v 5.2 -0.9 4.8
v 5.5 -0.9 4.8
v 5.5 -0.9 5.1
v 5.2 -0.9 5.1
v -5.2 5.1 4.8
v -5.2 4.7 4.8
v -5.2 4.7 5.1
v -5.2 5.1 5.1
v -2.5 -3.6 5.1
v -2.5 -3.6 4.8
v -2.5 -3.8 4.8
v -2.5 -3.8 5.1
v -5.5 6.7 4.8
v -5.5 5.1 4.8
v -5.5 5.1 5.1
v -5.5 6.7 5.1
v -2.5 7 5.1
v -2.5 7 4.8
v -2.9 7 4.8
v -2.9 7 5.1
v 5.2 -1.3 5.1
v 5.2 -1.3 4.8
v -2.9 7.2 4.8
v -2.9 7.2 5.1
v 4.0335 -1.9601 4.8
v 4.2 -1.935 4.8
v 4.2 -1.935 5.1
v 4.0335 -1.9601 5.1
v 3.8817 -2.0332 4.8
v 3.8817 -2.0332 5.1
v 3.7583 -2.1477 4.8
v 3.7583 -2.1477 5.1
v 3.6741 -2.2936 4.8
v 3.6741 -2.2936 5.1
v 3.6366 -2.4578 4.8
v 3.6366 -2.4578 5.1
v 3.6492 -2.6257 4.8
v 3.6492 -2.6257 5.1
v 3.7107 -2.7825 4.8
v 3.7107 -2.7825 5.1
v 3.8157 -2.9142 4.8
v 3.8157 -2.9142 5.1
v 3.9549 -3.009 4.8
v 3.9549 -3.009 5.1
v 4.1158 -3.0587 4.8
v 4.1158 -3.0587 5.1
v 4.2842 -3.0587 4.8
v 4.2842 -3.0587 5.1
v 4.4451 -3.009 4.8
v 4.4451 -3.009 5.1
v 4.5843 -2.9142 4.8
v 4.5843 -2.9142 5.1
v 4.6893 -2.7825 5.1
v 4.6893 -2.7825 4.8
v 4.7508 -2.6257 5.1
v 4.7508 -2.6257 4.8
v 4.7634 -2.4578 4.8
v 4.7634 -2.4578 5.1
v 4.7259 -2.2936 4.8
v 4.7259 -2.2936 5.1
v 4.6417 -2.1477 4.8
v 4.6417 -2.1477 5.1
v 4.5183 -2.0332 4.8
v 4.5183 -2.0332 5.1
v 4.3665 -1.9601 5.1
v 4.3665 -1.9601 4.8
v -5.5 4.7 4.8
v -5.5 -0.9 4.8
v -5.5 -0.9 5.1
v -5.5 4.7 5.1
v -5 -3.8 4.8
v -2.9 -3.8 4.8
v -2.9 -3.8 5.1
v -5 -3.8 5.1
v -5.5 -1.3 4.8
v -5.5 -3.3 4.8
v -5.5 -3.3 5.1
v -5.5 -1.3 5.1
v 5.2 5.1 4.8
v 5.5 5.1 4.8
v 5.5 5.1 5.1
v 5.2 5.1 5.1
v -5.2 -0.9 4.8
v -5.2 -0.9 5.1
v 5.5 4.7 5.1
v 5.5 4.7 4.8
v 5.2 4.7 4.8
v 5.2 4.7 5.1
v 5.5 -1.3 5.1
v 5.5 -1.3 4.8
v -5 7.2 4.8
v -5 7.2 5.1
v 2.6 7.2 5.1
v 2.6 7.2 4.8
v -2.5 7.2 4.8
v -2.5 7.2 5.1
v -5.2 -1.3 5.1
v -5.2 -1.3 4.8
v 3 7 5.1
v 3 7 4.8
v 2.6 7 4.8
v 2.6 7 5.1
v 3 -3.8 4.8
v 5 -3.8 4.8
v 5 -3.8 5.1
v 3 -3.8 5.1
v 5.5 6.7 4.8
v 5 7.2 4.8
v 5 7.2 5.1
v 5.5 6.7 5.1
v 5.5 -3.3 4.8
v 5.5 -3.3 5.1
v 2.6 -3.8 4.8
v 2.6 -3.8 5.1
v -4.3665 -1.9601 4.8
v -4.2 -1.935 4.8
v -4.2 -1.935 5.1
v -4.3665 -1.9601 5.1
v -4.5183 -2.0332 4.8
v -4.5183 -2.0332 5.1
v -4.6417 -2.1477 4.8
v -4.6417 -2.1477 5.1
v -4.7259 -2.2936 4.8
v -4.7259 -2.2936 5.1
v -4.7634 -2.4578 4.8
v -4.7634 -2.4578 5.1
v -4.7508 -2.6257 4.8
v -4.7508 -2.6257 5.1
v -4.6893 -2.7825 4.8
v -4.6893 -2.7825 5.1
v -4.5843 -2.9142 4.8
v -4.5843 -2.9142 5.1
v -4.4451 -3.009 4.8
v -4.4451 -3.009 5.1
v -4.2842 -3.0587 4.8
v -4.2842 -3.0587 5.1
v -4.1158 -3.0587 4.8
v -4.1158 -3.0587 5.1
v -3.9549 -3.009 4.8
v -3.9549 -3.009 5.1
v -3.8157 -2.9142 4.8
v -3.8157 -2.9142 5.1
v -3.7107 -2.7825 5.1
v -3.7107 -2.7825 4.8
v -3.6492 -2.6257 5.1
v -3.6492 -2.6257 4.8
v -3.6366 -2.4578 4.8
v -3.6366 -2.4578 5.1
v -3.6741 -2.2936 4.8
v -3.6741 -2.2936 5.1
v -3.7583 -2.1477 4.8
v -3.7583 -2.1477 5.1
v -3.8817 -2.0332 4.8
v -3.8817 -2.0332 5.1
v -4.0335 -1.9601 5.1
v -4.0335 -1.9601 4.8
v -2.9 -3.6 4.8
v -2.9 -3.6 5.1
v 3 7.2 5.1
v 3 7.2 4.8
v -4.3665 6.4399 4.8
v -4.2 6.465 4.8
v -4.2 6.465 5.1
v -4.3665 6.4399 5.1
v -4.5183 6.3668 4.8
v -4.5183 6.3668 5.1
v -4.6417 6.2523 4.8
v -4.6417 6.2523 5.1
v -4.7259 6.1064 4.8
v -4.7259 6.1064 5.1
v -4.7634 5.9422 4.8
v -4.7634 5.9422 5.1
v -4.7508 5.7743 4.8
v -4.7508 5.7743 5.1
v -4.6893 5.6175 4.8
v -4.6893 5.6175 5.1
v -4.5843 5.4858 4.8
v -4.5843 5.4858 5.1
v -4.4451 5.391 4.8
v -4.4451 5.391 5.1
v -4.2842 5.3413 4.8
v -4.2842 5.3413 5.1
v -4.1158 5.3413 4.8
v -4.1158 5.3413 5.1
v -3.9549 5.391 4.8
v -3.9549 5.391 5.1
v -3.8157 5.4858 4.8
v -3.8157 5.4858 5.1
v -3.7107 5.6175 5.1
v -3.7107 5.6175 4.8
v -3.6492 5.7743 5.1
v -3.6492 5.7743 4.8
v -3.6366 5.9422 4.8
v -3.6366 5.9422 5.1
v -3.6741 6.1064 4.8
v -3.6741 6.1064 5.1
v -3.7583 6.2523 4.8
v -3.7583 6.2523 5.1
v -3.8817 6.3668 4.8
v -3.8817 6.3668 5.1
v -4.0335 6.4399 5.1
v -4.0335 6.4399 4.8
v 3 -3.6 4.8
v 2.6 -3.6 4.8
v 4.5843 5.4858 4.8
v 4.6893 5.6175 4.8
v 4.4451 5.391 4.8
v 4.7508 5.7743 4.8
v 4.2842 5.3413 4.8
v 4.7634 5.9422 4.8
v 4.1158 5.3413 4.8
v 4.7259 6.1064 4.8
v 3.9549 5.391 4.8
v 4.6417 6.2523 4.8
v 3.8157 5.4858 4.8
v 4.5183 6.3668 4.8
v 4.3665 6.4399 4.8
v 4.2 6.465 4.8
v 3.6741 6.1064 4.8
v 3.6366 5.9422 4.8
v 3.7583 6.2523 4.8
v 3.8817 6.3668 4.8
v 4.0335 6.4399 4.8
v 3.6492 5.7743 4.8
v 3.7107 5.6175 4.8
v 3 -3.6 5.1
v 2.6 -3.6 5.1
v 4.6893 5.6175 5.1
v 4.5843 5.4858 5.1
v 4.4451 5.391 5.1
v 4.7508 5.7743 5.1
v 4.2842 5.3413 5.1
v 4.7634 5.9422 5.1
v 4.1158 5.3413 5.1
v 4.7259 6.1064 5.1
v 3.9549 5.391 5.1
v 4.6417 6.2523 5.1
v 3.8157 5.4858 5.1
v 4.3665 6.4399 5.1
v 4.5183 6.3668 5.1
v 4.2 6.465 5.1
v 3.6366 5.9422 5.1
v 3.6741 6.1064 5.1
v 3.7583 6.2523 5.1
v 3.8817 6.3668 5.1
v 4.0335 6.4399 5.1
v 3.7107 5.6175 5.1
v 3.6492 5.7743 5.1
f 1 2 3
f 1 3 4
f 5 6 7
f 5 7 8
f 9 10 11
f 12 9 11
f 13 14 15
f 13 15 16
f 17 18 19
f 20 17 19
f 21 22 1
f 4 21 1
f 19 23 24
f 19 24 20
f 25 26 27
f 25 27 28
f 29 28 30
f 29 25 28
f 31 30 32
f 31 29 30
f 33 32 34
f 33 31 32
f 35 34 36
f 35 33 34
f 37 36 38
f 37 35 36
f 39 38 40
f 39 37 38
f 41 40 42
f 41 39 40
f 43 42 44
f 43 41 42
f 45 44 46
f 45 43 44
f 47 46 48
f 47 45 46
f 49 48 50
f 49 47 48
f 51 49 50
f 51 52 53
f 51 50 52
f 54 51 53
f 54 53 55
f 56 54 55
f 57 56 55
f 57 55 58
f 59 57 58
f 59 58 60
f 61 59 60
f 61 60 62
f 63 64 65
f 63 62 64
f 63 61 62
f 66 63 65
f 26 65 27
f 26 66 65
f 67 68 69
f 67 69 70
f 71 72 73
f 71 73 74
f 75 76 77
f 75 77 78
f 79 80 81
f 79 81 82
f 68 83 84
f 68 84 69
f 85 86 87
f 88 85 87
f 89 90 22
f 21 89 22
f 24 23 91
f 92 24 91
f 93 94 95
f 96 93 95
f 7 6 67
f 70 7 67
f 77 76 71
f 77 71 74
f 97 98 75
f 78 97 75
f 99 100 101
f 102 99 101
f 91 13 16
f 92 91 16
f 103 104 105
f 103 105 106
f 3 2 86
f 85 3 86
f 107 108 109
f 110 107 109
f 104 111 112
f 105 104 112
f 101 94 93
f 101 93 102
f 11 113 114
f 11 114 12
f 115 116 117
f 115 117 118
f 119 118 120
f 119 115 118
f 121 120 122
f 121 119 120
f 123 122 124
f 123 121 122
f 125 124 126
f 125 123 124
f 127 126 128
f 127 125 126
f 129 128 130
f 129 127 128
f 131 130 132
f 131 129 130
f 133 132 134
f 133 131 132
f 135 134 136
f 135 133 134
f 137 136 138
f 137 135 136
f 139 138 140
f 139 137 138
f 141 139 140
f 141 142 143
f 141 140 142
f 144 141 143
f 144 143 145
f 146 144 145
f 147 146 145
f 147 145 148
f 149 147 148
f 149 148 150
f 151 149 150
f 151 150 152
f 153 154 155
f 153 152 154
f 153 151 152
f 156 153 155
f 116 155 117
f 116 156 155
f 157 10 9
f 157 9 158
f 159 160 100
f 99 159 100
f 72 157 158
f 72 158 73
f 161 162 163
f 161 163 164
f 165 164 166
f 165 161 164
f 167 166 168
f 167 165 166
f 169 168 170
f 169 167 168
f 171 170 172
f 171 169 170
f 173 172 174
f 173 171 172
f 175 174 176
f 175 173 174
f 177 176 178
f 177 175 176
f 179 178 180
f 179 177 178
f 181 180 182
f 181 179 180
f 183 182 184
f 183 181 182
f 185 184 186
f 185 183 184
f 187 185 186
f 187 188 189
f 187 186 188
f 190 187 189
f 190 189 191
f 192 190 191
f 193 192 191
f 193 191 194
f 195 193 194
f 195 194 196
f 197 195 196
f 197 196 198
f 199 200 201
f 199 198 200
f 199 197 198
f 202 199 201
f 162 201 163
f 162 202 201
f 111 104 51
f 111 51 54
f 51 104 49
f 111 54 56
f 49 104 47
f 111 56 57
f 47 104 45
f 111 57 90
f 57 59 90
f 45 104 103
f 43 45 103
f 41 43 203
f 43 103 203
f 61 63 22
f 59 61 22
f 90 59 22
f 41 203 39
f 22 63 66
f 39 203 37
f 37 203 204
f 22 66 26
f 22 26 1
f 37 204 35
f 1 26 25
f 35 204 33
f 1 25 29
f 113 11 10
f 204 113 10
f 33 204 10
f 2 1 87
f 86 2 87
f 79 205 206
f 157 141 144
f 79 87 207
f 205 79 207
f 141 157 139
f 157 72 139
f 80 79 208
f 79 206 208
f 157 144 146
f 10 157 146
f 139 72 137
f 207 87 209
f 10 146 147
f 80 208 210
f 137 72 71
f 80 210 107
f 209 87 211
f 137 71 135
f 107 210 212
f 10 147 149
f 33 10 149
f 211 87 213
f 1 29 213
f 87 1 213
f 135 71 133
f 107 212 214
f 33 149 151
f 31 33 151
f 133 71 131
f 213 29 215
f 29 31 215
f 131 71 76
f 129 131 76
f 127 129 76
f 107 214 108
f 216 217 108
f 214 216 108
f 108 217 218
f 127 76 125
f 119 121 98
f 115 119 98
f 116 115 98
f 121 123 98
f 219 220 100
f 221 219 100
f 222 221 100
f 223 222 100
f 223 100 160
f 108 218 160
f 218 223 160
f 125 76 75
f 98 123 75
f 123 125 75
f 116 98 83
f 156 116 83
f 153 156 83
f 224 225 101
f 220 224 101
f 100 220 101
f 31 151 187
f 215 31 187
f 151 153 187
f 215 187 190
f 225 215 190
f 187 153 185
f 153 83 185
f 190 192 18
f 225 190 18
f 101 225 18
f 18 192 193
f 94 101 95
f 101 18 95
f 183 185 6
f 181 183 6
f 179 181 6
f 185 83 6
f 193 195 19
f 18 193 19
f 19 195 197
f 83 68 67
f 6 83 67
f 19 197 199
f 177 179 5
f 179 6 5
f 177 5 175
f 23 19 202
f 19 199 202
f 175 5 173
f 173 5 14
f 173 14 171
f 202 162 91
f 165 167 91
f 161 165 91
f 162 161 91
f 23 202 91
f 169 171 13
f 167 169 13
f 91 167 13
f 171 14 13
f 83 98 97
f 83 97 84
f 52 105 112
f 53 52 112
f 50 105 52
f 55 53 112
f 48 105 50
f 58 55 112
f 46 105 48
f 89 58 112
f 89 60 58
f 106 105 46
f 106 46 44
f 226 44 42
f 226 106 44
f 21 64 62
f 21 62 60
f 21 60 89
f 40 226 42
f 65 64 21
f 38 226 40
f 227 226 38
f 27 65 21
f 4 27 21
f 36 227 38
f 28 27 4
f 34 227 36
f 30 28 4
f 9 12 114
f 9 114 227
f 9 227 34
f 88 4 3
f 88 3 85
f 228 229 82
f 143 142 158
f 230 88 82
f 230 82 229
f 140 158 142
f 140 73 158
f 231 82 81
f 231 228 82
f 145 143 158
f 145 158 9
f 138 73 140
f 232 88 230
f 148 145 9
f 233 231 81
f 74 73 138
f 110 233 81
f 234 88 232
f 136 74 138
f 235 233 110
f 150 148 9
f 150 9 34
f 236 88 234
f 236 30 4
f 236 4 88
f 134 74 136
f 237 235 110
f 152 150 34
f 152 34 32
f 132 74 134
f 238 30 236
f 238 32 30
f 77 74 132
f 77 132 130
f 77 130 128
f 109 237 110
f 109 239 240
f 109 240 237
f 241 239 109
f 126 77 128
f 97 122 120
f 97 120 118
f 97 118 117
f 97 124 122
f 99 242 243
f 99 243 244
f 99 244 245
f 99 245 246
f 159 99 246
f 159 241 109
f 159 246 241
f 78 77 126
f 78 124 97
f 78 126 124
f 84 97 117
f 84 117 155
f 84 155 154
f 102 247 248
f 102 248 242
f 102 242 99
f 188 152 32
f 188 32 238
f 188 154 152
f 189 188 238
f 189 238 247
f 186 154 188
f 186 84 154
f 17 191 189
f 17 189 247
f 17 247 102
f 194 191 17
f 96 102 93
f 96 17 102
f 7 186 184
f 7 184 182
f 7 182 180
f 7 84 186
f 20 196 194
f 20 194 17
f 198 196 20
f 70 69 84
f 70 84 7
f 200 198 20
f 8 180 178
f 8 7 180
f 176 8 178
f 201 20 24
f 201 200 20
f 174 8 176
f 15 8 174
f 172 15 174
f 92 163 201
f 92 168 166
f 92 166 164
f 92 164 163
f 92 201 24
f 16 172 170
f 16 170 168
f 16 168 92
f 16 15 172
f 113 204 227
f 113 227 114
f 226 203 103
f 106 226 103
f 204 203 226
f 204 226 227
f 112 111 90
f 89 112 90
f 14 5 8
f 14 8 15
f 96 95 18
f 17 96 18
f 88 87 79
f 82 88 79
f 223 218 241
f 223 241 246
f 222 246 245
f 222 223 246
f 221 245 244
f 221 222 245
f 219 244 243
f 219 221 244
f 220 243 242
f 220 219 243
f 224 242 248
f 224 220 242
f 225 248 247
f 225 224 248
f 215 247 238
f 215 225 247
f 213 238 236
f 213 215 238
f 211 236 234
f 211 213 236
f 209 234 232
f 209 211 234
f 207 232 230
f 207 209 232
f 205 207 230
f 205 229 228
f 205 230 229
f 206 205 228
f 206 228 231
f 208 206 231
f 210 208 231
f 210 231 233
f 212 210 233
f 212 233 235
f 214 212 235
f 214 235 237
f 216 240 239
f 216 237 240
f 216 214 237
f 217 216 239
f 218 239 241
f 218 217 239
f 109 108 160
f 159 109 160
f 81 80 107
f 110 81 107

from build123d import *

# Parameters (mm, degrees)
CYLINDER013_R          = 0.565
CYLINDER013_DEPTH      = 5
CYLINDER012_R          = 0.565
CYLINDER012_DEPTH      = 5
CYLINDER008_R          = 0.565
CYLINDER008_DEPTH      = 5
CYLINDER003_R          = 0.565
CYLINDER003_DEPTH      = 5
BOX018_W               = 0.4
BOX018_H               = 1
BOX018_DEPTH           = 1
BOX018_PLACEMENT_ANGLE = 90
BOX001_W               = 0.4
BOX001_H               = 1
BOX001_DEPTH           = 1
BOX001_PLACEMENT_ANGLE = 90
BOX014_W               = 0.4
BOX014_H               = 1
BOX014_DEPTH           = 1
BOX014_PLACEMENT_ANGLE = 90
BOX015_W               = 0.4
BOX015_H               = 1
BOX015_DEPTH           = 1
BOX015_PLACEMENT_ANGLE = 90
BOX017_W               = 0.4
BOX017_H               = 1
BOX017_DEPTH           = 1
BOX016_W               = 0.4
BOX016_H               = 1
BOX016_DEPTH           = 1
BOX013_W               = 0.4
BOX013_H               = 1
BOX013_DEPTH           = 1
BOX_W                  = 0.4
BOX_H                  = 1
BOX_DEPTH              = 1
BOX012_W               = 11
BOX012_H               = 11
BOX012_DEPTH           = 0.3
CHAMFER002_SIZE        = 0.5
CUT010_PLACEMENT_ANGLE = 90


with BuildPart() as cilindro009:
    # Cylinder013 → Cylinder013 (new body)
    with BuildSketch(Plane(origin=(4.2, -4.2, 0), x_dir=(1, 0, 0), z_dir=(0, 0, 1))):
        Circle(CYLINDER013_R)
    extrude(amount=CYLINDER013_DEPTH)


with BuildPart() as cilindro008:
    # Cylinder012 → Cylinder012 (new body)
    with BuildSketch(Plane(origin=(-4.2, -4.2, 0), x_dir=(1, 0, 0), z_dir=(0, 0, 1))):
        Circle(CYLINDER012_R)
    extrude(amount=CYLINDER012_DEPTH)


with BuildPart() as cilindro006:
    # Cylinder008 → Cylinder008 (new body)
    with BuildSketch(Plane(origin=(4.2, 4.2, 0), x_dir=(1, 0, 0), z_dir=(0, 0, 1))):
        Circle(CYLINDER008_R)
    extrude(amount=CYLINDER008_DEPTH)


with BuildPart() as cilindro007:
    # Cylinder003 → Cylinder003 (new body)
    with BuildSketch(Plane(origin=(-4.2, 4.2, 0), x_dir=(1, 0, 0), z_dir=(0, 0, 1))):
        Circle(CYLINDER003_R)
    extrude(amount=CYLINDER003_DEPTH)


with BuildPart() as pesta_adinf001:
    # Box018 → Box018 (new body)
    with BuildSketch(Plane.XY):
        with Locations((0.2, 0.5)):
            Rectangle(BOX018_W, BOX018_H)
    extrude(amount=BOX018_DEPTH)


with BuildPart() as pesta_adinf001_1:
    # Box018 placement: moved
    add(pesta_adinf001.part.moved(Location((6.3, -3, 3))).rotate(Axis((6.3, -3, 3), (0, 0, 1)), BOX018_PLACEMENT_ANGLE))


with BuildPart() as pesta_ads001:
    # Box001 → Box001 (new body)
    with BuildSketch(Plane.XY):
        with Locations((0.2, 0.5)):
            Rectangle(BOX001_W, BOX001_H)
    extrude(amount=BOX001_DEPTH)


with BuildPart() as pesta_ads001_1:
    # Box001 placement: moved
    add(pesta_ads001.part.moved(Location((6.3, 2.5, 3))).rotate(Axis((6.3, 2.5, 3), (0, 0, 1)), BOX001_PLACEMENT_ANGLE))


with BuildPart() as pesta_aiinf001:
    # Box014 → Box014 (new body)
    with BuildSketch(Plane.XY):
        with Locations((0.2, 0.5)):
            Rectangle(BOX014_W, BOX014_H)
    extrude(amount=BOX014_DEPTH)


with BuildPart() as pesta_aiinf001_1:
    # Box014 placement: moved
    add(pesta_aiinf001.part.moved(Location((-5.3, -3, 3))).rotate(Axis((-5.3, -3, 3), (0, 0, 1)), BOX014_PLACEMENT_ANGLE))


with BuildPart() as pesta_ais001:
    # Box015 → Box015 (new body)
    with BuildSketch(Plane.XY):
        with Locations((0.2, 0.5)):
            Rectangle(BOX015_W, BOX015_H)
    extrude(amount=BOX015_DEPTH)


with BuildPart() as pesta_ais001_1:
    # Box015 placement: moved
    add(pesta_ais001.part.moved(Location((-5.3, 2.5, 3))).rotate(Axis((-5.3, 2.5, 3), (0, 0, 1)), BOX015_PLACEMENT_ANGLE))


with BuildPart() as pesta_aid001:
    # Box017 → Box017 (new body)
    with BuildSketch(Plane(origin=(3, -6.2, 3), x_dir=(1, 0, 0), z_dir=(0, 0, 1))):
        with Locations((0.2, 0.5)):
            Rectangle(BOX017_W, BOX017_H)
    extrude(amount=BOX017_DEPTH)


with BuildPart() as pesta_aii001:
    # Box016 → Box016 (new body)
    with BuildSketch(Plane(origin=(-3, -6.2, 3), x_dir=(1, 0, 0), z_dir=(0, 0, 1))):
        with Locations((0.2, 0.5)):
            Rectangle(BOX016_W, BOX016_H)
    extrude(amount=BOX016_DEPTH)


with BuildPart() as pesta_asd001:
    # Box013 → Box013 (new body)
    with BuildSketch(Plane(origin=(3, 5.2, 3), x_dir=(1, 0, 0), z_dir=(0, 0, 1))):
        with Locations((0.2, 0.5)):
            Rectangle(BOX013_W, BOX013_H)
    extrude(amount=BOX013_DEPTH)


with BuildPart() as pesta_asi001:
    # Box → Box (new body)
    with BuildSketch(Plane(origin=(-3, 5.2, 3), x_dir=(1, 0, 0), z_dir=(0, 0, 1))):
        with Locations((0.2, 0.5)):
            Rectangle(BOX_W, BOX_H)
    extrude(amount=BOX_DEPTH)


with BuildPart() as chapametalica:
    # Box012 → Box012 (new body)
    with BuildSketch(Plane(origin=(-5.5, -5.5, 3.6), x_dir=(1, 0, 0), z_dir=(0, 0, 1))):
        with Locations((5.5, 5.5)):
            Rectangle(BOX012_W, BOX012_H)
    extrude(amount=BOX012_DEPTH)

    # Chamfer002
    chamfer002_edges = [chapametalica.edges().sort_by_distance(p)[0] for p in [
        (-5.5, -5.5, 3.75),
        (-5.5, 5.5, 3.75),
        (5.5, -5.5, 3.75),
        (5.5, 5.5, 3.75),
    ]]
    chamfer(chamfer002_edges, length=CHAMFER002_SIZE)


with BuildPart() as chapametalica_1:
    # Chamfer002 placement: moved
    add(chapametalica.part.moved(Location((0, 0, -0.4))))

    # Cut021: cut pestañaSI001
    add(pesta_asi001.part, mode=Mode.SUBTRACT)

    # Cut022: cut pestañaSD001
    add(pesta_asd001.part, mode=Mode.SUBTRACT)

    # Cut029: cut pestañaII001
    add(pesta_aii001.part, mode=Mode.SUBTRACT)

    # Cut006: cut pestañaID001
    add(pesta_aid001.part, mode=Mode.SUBTRACT)

    # Cut005: cut pestañaIS001
    add(pesta_ais001_1.part, mode=Mode.SUBTRACT)

    # Cut023: cut pestañaIInf001
    add(pesta_aiinf001_1.part, mode=Mode.SUBTRACT)

    # Cut009: cut pestañaDS001
    add(pesta_ads001_1.part, mode=Mode.SUBTRACT)

    # Cut003: cut pestañaDInf001
    add(pesta_adinf001_1.part, mode=Mode.SUBTRACT)

    # Cut028: cut Cilindro007
    add(cilindro007.part, mode=Mode.SUBTRACT)

    # Cut027: cut Cilindro006
    add(cilindro006.part, mode=Mode.SUBTRACT)

    # Cut004: cut Cilindro008
    add(cilindro008.part, mode=Mode.SUBTRACT)

    # Cut010: cut Cilindro009
    add(cilindro009.part, mode=Mode.SUBTRACT)


with BuildPart() as chapametalica_2:
    # Cut010 placement: moved
    add(chapametalica_1.part.moved(Location((0, 1.7, 1.6))).rotate(Axis((0, 1.7, 1.6), (0, 0, 1)), CUT010_PLACEMENT_ANGLE))


solid = chapametalica_2.part
